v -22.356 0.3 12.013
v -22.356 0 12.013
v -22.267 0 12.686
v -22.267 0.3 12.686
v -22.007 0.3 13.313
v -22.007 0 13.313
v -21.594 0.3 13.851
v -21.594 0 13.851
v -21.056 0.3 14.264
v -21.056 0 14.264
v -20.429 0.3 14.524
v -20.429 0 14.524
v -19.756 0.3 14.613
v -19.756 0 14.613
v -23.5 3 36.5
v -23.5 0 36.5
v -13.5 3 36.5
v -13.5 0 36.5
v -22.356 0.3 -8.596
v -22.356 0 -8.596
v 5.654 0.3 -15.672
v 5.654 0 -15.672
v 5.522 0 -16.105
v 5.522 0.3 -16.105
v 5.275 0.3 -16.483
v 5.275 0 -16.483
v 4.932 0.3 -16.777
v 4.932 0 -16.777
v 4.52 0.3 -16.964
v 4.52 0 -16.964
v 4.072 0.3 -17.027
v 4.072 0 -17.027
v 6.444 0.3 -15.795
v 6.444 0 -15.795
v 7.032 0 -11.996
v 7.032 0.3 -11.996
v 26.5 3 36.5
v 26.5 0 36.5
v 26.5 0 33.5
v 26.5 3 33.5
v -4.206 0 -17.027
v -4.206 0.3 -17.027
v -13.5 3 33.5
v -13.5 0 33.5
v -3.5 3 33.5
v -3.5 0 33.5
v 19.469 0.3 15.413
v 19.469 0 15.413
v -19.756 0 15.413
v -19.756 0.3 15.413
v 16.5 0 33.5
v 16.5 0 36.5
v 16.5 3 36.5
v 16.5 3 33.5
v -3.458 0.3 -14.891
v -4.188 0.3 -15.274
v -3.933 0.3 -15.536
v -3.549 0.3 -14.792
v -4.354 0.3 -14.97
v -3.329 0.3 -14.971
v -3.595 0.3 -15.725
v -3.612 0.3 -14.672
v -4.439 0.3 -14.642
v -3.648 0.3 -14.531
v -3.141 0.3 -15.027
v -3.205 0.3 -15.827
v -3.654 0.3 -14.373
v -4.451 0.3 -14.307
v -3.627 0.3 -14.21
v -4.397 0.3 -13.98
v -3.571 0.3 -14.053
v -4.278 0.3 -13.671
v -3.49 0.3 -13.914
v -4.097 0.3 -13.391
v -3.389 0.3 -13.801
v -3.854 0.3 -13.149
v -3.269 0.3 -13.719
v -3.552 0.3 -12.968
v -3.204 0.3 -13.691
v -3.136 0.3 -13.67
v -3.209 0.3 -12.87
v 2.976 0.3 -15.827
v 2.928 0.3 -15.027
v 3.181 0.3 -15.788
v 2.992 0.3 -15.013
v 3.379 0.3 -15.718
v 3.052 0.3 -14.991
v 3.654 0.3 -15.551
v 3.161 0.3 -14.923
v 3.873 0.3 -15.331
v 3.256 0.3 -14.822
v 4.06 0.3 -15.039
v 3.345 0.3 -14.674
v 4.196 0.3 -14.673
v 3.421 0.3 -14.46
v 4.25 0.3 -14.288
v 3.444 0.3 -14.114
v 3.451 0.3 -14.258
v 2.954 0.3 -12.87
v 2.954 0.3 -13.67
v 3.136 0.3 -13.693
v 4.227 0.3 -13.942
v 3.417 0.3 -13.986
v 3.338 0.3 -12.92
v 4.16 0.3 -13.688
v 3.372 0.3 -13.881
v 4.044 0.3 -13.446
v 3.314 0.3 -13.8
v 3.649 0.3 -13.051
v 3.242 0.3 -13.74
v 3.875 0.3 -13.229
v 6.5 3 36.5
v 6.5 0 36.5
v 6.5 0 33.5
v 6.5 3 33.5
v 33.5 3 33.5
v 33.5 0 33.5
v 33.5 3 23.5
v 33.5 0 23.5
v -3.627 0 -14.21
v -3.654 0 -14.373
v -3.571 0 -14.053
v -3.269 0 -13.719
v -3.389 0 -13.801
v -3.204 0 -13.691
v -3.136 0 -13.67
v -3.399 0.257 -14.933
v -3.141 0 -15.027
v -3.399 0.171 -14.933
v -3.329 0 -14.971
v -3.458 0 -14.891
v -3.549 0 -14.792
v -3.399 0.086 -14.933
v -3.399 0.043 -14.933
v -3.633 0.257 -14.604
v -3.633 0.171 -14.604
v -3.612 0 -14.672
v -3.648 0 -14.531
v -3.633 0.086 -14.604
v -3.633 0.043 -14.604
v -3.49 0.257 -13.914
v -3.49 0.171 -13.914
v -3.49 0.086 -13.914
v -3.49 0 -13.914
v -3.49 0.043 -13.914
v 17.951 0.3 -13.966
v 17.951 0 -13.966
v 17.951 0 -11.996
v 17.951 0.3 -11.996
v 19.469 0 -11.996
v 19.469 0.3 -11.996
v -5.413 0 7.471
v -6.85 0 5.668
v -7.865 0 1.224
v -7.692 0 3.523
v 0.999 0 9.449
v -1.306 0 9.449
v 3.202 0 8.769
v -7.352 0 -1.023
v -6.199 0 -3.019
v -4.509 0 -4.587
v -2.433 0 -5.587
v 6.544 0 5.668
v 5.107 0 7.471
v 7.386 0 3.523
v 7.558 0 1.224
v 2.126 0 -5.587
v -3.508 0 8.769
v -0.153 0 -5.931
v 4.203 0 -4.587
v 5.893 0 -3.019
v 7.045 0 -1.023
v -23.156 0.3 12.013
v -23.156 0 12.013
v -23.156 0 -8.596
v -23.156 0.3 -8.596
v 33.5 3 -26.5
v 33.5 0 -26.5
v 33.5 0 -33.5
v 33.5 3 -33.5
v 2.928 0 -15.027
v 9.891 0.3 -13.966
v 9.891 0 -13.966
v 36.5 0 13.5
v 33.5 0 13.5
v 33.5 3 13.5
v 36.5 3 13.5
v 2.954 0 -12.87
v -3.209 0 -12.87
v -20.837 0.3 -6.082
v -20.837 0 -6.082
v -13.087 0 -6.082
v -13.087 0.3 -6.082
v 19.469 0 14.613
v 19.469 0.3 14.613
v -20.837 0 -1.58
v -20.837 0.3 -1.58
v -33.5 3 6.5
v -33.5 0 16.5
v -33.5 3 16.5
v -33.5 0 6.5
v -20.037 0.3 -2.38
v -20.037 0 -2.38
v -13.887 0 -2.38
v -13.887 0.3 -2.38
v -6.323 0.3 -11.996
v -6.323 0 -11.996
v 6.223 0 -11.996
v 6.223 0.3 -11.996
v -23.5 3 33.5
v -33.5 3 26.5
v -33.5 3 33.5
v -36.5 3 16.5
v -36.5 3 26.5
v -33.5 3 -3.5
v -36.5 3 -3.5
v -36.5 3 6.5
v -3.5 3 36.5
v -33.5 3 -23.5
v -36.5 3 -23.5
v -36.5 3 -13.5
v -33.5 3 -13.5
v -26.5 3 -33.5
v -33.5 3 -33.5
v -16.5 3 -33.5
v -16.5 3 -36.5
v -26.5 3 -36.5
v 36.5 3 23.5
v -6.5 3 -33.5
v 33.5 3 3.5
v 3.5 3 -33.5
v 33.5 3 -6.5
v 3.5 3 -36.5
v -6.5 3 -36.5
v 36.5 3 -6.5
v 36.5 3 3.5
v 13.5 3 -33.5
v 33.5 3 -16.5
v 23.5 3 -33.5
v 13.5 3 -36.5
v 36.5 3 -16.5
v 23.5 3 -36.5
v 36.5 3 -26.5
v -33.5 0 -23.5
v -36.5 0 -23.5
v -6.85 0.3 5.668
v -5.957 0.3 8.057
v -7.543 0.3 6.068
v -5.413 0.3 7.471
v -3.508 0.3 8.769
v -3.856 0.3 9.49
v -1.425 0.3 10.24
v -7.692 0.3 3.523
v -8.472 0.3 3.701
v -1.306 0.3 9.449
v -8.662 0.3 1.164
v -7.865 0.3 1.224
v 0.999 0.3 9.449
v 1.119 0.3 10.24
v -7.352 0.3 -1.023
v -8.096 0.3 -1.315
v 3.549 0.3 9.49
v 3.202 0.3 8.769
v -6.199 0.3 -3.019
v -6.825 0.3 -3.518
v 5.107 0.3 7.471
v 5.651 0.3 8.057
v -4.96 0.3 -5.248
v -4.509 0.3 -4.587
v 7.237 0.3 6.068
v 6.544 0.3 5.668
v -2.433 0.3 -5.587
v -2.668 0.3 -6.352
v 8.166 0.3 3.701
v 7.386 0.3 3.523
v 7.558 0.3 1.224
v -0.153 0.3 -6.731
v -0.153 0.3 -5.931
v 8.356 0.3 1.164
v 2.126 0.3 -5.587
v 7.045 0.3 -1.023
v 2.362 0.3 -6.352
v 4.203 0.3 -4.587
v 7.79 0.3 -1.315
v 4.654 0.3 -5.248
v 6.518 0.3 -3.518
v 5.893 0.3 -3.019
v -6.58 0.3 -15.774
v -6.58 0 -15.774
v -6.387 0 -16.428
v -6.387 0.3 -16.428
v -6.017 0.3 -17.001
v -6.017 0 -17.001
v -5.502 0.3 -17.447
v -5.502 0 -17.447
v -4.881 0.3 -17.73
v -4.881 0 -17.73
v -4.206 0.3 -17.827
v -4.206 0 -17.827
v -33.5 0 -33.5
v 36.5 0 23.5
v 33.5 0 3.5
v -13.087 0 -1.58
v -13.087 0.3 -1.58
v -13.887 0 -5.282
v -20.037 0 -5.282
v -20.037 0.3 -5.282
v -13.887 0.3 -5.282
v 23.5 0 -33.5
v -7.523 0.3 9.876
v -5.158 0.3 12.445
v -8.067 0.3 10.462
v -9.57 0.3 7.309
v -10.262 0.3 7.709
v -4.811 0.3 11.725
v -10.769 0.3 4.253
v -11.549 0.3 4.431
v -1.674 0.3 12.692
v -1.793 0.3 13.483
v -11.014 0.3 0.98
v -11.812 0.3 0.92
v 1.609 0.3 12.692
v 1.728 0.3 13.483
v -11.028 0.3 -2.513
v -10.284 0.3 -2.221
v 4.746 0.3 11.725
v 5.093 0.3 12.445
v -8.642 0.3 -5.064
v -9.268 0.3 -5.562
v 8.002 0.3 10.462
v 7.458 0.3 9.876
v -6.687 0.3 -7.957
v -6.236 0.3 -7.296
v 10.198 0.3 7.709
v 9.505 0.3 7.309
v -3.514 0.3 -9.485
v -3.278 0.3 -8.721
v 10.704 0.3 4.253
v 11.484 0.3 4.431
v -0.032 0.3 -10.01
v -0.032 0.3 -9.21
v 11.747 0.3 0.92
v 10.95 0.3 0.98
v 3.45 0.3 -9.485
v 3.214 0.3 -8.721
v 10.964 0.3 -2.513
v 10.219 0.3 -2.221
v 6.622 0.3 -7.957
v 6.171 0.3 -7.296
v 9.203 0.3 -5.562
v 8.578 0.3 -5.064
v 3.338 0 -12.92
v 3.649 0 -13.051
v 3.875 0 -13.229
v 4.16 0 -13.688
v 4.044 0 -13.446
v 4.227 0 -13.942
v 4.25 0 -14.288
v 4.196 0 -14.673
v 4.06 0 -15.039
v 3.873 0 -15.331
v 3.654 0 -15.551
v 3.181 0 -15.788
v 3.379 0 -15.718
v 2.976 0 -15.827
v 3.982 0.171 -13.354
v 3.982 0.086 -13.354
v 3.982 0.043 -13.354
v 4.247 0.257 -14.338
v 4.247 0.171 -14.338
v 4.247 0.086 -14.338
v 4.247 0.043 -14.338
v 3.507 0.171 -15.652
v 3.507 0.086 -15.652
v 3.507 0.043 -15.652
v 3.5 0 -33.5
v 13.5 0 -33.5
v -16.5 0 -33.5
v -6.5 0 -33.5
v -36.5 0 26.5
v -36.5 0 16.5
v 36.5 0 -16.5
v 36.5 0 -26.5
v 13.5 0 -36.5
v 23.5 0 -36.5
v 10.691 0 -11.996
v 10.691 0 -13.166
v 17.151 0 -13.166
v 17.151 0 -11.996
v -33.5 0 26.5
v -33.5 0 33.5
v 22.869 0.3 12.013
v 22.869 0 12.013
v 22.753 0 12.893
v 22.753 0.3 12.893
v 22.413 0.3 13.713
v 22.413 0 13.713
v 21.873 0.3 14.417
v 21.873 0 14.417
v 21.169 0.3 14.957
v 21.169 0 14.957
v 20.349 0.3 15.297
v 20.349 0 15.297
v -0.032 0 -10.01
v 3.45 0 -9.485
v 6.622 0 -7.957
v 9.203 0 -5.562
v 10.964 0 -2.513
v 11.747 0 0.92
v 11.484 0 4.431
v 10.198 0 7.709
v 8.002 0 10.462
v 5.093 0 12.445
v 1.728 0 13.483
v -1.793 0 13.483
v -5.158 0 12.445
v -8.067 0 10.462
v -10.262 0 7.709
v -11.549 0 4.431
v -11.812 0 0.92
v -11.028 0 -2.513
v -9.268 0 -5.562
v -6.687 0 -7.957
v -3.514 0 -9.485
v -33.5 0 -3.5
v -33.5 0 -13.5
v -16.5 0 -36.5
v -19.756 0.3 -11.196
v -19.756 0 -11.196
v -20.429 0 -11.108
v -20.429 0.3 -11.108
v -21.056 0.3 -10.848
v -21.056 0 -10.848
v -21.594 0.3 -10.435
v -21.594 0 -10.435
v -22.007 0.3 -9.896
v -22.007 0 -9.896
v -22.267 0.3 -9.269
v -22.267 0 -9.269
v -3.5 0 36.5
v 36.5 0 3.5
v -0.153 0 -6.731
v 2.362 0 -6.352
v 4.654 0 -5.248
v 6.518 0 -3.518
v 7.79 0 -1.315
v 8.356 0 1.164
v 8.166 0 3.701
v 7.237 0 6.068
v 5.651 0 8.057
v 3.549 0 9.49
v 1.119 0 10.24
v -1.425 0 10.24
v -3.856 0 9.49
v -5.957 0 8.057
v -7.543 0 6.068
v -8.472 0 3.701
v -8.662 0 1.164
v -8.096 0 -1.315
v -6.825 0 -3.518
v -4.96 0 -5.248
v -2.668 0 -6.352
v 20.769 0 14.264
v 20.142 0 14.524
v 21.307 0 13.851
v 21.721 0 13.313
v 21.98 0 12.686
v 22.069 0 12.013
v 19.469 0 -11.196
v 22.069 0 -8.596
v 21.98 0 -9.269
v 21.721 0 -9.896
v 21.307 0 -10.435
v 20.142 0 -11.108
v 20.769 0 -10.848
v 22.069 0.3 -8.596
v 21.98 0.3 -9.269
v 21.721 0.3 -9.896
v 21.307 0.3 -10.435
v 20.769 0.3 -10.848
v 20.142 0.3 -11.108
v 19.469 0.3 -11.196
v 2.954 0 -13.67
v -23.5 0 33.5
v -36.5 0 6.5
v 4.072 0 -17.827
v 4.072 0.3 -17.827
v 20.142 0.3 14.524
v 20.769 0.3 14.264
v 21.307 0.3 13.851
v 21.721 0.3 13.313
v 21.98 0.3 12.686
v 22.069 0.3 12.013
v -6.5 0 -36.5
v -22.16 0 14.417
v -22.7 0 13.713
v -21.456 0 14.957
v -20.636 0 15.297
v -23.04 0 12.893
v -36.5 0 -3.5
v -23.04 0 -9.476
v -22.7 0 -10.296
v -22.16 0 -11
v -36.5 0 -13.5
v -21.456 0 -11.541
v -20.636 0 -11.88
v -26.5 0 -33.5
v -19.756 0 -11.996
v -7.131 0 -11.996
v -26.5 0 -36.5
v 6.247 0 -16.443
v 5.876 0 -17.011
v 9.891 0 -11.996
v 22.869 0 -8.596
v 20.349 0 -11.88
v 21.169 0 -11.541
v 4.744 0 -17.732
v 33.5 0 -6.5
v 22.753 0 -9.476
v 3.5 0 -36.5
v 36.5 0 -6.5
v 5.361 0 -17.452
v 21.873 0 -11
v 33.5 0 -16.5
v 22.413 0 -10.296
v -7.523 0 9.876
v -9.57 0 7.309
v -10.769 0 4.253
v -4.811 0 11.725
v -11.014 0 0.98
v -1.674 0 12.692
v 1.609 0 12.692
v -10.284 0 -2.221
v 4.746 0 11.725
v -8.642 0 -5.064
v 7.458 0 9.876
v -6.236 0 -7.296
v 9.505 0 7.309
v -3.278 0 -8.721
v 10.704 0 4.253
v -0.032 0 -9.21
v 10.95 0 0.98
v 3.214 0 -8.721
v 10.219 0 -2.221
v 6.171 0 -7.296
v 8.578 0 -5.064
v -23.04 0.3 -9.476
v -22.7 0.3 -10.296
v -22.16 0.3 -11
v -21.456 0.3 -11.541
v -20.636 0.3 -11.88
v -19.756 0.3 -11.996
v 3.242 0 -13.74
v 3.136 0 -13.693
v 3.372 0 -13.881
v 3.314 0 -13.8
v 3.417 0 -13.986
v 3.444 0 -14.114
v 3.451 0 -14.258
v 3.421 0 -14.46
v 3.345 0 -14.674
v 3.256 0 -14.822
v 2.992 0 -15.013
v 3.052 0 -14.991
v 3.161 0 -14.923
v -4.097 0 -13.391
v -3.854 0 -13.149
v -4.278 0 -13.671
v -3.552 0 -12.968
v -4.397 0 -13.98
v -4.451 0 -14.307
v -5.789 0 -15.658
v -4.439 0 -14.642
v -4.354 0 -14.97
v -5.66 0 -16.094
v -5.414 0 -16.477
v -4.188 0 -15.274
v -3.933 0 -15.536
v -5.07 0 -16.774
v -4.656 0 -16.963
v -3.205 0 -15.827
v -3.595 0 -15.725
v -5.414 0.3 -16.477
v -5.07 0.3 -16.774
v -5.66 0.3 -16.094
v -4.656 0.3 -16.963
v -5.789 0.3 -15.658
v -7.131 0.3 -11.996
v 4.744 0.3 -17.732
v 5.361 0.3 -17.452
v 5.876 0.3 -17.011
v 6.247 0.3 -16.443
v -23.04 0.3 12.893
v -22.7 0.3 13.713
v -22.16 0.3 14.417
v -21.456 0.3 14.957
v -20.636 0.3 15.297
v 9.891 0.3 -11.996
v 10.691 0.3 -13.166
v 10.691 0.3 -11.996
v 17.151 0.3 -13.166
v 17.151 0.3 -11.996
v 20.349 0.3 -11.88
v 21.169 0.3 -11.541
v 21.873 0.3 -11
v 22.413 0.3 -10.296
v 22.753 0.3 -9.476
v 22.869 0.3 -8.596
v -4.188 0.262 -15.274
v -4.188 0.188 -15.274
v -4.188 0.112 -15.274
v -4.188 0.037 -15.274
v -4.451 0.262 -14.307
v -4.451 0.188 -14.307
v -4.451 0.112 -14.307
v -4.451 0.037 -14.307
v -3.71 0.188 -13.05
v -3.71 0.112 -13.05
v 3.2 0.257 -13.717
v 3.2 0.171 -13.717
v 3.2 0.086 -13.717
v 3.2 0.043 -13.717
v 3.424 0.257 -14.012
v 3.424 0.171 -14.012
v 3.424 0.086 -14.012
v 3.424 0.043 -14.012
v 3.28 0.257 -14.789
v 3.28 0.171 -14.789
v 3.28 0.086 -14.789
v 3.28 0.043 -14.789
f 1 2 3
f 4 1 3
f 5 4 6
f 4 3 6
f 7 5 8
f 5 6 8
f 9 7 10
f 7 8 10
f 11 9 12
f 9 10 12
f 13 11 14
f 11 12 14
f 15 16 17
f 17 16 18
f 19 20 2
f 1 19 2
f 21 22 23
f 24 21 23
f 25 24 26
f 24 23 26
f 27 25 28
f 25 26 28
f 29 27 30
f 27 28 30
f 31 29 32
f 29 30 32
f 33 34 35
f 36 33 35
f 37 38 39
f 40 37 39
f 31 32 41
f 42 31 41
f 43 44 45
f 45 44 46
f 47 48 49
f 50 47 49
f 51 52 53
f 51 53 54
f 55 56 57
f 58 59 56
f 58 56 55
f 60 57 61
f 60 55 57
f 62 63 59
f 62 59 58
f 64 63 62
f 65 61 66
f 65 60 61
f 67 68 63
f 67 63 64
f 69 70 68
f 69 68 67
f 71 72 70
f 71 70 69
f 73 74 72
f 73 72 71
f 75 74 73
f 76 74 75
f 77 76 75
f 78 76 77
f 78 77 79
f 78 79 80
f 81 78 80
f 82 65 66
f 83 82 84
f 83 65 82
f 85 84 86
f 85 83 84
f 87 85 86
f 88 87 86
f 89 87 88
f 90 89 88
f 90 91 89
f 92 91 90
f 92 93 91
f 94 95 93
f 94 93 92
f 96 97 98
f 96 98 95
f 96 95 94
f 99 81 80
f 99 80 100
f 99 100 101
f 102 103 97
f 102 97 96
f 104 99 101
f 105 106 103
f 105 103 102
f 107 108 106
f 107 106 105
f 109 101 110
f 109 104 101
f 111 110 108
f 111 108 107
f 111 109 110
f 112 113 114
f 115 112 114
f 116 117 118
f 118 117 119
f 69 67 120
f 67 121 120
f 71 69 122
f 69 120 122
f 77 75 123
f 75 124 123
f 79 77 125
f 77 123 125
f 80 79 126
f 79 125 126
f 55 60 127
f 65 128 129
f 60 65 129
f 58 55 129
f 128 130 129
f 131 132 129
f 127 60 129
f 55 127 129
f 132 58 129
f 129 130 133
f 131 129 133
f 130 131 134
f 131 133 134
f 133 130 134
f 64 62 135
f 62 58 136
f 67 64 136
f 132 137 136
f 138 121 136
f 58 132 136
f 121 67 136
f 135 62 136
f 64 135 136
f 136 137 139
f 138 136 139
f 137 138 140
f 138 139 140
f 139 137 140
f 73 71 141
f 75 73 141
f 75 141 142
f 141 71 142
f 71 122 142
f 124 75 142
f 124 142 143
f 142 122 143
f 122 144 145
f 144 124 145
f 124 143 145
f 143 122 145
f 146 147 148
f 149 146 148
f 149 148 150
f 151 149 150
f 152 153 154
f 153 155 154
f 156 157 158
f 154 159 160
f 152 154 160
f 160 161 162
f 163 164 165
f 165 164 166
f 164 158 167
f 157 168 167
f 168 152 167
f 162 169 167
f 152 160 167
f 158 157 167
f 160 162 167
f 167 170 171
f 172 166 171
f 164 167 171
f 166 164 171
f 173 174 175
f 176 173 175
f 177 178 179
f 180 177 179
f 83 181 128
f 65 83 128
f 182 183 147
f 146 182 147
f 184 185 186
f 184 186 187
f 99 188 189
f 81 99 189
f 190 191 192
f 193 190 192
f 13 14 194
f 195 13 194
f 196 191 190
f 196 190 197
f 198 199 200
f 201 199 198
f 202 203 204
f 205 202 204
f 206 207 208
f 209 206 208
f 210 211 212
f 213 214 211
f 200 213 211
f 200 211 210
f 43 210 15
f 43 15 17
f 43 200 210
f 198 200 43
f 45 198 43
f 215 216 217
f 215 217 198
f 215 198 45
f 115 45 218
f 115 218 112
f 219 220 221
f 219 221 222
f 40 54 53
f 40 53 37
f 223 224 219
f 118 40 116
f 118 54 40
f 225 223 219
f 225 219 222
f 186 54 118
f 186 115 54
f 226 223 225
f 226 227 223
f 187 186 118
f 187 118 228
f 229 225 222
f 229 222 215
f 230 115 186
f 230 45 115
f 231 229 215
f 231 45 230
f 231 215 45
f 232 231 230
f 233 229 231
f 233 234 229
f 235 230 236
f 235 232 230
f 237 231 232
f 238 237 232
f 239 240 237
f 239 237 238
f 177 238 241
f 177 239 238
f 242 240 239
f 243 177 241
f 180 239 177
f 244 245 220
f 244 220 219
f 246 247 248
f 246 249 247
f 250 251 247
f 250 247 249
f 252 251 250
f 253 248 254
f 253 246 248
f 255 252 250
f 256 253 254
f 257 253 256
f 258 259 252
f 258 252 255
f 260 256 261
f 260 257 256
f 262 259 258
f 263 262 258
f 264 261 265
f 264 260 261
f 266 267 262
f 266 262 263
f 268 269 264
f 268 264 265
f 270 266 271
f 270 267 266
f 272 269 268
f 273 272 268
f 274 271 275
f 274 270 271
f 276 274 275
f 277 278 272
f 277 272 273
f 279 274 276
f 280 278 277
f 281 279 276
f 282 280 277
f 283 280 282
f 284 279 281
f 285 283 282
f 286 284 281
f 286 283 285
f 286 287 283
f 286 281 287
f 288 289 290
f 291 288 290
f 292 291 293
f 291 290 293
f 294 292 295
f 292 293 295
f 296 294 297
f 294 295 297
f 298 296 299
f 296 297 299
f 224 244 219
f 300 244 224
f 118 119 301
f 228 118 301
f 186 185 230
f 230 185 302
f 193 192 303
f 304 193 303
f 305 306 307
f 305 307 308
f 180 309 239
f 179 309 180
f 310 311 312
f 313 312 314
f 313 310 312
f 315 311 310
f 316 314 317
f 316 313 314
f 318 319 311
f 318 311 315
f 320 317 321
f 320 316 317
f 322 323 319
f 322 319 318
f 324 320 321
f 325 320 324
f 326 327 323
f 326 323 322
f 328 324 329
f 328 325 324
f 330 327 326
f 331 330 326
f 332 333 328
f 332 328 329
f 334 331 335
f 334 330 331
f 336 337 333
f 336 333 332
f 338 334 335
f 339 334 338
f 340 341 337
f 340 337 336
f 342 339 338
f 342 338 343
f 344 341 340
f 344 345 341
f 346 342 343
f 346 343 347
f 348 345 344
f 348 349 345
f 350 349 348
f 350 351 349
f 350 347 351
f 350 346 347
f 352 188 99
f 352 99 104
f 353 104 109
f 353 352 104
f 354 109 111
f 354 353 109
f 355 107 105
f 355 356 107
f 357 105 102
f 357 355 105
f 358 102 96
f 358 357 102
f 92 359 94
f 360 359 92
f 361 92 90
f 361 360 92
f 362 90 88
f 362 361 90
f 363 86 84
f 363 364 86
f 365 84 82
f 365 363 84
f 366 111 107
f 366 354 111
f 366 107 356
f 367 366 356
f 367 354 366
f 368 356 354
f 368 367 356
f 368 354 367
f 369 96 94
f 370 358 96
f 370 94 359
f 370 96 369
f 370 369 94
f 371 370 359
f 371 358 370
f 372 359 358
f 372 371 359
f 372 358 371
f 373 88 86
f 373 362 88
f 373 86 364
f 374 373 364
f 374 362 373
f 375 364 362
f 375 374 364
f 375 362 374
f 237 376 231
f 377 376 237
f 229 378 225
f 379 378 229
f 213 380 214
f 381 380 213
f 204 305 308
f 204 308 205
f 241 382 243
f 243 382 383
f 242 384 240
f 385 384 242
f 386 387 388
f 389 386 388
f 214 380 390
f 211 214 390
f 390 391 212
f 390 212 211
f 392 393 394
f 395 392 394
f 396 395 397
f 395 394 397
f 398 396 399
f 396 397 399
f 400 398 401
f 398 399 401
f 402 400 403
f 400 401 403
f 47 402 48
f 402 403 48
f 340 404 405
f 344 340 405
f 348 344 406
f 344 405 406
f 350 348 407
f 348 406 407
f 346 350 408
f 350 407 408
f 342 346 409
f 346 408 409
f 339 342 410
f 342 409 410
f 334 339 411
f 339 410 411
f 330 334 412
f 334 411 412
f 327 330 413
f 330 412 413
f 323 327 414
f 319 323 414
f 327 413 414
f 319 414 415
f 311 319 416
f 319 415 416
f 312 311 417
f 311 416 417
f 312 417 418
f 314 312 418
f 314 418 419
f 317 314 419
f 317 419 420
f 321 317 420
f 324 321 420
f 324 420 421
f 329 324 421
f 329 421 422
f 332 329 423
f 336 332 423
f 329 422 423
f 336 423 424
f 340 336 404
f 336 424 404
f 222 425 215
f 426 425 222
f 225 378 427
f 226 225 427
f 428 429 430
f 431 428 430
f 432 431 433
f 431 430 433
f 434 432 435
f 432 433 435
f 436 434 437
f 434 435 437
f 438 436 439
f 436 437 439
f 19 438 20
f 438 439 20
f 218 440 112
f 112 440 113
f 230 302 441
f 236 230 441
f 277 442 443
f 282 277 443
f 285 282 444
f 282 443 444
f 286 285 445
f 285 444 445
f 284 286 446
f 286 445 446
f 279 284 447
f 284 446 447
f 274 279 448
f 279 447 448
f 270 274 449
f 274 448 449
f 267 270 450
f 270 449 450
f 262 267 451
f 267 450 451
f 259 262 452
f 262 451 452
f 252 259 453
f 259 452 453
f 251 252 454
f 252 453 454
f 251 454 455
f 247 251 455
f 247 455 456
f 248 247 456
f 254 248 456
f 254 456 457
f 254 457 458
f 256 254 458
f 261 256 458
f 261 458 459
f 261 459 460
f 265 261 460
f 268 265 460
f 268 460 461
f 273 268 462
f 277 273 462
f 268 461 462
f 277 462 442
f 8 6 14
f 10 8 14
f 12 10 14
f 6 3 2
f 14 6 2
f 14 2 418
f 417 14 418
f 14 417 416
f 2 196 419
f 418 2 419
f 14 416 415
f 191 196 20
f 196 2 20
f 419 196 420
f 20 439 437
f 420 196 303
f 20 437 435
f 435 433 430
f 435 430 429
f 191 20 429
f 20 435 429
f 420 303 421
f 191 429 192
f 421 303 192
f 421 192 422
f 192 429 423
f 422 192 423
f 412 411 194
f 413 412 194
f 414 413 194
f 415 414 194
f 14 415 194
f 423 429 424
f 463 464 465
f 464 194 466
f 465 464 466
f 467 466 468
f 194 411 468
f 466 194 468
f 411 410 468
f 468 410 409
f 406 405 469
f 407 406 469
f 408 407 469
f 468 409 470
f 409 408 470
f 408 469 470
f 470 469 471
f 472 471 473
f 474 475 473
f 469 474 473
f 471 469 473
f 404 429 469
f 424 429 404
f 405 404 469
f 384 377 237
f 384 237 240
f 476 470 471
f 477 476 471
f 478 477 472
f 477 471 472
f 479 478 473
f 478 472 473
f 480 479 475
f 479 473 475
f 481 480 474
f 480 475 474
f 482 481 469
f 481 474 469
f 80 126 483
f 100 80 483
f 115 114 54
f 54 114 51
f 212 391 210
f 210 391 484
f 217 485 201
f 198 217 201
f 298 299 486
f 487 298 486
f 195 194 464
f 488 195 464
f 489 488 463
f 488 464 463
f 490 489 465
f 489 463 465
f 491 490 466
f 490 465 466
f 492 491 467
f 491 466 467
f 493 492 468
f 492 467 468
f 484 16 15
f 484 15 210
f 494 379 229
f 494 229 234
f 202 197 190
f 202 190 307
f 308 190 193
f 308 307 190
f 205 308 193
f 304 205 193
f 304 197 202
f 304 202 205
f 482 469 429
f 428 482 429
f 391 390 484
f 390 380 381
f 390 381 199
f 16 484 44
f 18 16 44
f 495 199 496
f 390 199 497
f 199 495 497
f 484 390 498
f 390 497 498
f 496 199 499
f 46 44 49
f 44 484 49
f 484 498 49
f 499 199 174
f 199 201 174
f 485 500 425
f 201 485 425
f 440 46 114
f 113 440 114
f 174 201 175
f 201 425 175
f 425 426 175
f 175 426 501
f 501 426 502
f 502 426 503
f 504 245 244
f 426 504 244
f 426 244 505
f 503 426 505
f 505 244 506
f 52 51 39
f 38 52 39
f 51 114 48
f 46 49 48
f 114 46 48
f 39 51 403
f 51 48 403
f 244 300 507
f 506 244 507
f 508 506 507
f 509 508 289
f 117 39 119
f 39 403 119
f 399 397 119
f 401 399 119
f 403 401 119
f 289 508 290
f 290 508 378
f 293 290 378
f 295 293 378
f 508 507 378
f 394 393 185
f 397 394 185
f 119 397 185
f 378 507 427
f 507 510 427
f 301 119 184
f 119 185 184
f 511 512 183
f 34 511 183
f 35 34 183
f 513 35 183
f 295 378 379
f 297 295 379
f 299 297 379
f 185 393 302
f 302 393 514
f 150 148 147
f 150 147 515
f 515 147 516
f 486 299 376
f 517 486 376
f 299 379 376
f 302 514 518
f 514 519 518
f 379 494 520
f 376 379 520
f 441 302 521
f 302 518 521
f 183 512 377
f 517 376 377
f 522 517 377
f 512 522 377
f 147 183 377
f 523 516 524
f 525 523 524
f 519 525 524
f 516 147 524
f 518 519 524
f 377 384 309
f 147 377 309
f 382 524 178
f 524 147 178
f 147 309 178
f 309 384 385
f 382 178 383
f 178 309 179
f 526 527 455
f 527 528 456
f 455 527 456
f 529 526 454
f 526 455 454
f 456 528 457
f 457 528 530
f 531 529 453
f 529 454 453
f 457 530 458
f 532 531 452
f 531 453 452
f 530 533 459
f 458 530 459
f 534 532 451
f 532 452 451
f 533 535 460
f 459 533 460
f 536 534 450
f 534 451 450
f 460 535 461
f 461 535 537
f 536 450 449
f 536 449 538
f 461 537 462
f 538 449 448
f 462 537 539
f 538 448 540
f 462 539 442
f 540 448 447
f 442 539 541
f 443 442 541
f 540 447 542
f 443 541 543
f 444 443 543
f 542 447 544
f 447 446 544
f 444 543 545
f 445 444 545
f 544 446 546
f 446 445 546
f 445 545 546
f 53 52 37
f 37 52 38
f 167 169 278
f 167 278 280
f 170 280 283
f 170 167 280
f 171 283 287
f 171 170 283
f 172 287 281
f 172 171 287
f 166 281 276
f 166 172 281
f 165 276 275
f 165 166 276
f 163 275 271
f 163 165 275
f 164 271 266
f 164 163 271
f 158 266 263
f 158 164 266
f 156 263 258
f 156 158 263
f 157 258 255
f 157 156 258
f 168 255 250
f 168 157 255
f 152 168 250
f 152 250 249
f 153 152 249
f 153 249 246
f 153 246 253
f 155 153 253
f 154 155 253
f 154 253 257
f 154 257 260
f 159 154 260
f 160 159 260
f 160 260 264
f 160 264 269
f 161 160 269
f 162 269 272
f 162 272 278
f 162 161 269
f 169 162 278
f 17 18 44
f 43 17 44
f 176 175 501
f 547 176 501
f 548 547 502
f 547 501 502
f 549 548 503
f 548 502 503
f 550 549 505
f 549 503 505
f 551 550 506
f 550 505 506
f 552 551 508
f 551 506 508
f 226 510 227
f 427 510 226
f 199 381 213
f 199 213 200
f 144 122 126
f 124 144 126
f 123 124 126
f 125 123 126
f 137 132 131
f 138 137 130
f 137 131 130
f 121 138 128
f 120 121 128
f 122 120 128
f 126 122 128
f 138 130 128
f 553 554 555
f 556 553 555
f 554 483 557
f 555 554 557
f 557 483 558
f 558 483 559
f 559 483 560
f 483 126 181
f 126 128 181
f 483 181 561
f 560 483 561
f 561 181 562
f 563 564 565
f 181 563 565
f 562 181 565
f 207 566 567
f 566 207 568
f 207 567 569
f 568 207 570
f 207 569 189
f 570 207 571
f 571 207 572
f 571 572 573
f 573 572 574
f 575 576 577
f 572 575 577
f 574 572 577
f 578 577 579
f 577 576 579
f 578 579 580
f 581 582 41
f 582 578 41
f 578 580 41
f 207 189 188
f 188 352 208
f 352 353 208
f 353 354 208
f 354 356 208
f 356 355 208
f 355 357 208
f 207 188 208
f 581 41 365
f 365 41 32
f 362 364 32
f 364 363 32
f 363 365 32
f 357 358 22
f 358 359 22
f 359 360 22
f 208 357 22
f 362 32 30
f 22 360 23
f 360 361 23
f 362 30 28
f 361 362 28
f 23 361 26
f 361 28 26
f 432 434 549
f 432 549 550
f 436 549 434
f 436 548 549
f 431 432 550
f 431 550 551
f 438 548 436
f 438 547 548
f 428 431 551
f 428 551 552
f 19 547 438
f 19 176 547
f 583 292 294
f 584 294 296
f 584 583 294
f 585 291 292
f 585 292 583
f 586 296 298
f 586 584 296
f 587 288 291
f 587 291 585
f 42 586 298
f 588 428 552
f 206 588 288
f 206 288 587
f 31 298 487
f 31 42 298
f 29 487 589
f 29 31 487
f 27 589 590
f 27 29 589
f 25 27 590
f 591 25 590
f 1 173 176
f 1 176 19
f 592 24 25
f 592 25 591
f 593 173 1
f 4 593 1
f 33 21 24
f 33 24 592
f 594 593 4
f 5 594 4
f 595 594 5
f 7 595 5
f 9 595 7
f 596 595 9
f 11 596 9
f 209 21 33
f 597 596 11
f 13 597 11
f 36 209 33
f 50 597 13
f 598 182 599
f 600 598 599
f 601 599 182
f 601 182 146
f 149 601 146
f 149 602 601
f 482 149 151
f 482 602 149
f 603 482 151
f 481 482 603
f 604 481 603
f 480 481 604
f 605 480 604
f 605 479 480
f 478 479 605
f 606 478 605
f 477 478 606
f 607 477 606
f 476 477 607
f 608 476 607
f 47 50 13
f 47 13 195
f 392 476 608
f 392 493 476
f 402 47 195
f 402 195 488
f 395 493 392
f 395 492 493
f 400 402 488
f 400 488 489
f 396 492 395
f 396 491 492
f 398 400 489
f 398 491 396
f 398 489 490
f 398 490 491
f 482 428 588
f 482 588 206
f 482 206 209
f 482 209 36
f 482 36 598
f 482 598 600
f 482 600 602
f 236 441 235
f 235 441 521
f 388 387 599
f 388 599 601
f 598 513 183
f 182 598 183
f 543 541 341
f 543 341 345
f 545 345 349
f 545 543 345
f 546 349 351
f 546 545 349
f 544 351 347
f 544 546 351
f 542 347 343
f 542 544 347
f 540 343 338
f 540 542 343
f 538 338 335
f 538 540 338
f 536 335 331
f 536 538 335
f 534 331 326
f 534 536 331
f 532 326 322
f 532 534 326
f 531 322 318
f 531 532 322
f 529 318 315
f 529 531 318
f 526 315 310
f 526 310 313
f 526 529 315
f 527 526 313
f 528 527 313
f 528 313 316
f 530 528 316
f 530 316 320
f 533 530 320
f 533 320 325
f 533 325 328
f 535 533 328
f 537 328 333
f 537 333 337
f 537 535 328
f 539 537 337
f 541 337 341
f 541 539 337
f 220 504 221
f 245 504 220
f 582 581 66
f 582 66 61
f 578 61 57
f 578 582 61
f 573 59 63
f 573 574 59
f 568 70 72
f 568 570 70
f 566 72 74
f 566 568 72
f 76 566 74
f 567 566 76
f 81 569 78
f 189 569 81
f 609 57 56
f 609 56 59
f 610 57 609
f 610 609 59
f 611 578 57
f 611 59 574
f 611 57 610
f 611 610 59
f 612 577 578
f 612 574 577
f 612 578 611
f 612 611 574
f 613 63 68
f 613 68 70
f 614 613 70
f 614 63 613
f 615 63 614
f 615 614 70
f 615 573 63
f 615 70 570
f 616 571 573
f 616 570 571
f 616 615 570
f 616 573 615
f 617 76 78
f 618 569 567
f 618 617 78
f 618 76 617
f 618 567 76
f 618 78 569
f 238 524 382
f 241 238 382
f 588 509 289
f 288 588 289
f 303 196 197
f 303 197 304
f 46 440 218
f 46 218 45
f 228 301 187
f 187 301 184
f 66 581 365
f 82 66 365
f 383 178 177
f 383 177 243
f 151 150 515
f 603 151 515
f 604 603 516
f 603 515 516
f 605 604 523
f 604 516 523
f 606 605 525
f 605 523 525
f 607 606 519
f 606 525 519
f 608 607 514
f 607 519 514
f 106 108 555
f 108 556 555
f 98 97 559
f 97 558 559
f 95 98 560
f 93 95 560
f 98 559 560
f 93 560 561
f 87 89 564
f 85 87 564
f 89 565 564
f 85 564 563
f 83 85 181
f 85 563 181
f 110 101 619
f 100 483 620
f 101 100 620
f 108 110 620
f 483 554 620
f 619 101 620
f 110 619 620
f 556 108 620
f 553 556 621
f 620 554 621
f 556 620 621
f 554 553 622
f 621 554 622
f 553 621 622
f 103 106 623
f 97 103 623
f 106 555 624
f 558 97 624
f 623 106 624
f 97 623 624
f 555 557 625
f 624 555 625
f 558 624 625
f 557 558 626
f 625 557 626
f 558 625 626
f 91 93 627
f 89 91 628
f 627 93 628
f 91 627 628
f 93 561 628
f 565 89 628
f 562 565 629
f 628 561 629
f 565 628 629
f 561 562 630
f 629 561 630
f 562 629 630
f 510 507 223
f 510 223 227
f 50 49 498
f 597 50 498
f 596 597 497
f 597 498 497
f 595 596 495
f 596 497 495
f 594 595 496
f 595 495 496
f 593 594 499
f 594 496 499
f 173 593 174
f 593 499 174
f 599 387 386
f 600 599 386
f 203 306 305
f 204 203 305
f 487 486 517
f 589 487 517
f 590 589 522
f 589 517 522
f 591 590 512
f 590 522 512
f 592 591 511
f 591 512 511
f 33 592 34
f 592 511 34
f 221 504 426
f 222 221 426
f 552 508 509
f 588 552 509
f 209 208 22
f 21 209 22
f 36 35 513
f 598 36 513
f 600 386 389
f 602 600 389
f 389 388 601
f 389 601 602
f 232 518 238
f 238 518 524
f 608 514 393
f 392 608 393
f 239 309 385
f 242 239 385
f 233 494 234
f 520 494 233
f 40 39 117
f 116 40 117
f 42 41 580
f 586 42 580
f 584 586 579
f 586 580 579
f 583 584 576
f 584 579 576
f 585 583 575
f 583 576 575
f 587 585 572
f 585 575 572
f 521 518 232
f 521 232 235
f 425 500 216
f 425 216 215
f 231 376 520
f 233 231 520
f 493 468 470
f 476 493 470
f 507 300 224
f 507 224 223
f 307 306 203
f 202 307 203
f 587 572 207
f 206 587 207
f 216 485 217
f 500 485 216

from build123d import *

# Parameters (mm, degrees)
SKETCH1_W           = 67
SKETCH1_H           = 67
SKETCH1_W_2         = 3
SKETCH1_H_2         = 10
SKETCH1_W_3         = 10
SKETCH1_H_3         = 3
BOSS_EXTRUDE1_DEPTH = 3
SKETCH3_W           = 6.460545278
SKETCH3_H           = 1.169767542
SKETCH3_W_2         = 7.74987154
SKETCH3_H_2         = 4.501562016
SKETCH3_W_3         = 6.14987154
SKETCH3_H_3         = 2.901562016
SKETCH3_R           = 11.812674278
SKETCH3_R_2         = 11.012674278
SKETCH3_R_3         = 8.532957956
SKETCH3_R_4         = 7.732957956
CUT_EXTRUDE1_DEPTH  = 0.3


with BuildPart() as part:
    # Sketch1 → Boss-Extrude1 (new body)
    with BuildSketch(Plane(origin=(0, 0, 0), x_dir=(1, 0, 0), z_dir=(0, 1, 0))):
        Rectangle(SKETCH1_W, SKETCH1_H)
        with Locations((-35, -21.5)):
            Rectangle(SKETCH1_W_2, SKETCH1_H_2)
        with Locations((-35, -1.5)):
            Rectangle(SKETCH1_W_2, SKETCH1_H_2)
        with Locations((-35, 18.5)):
            Rectangle(SKETCH1_W_2, SKETCH1_H_2)
        with Locations((-18.5, -35)):
            Rectangle(SKETCH1_W_3, SKETCH1_H_3)
        with Locations((1.5, -35)):
            Rectangle(SKETCH1_W_3, SKETCH1_H_3)
        with Locations((21.5, -35)):
            Rectangle(SKETCH1_W_3, SKETCH1_H_3)
        with Locations((35, -18.5)):
            Rectangle(SKETCH1_W_2, SKETCH1_H_2)
        with Locations((35, 1.5)):
            Rectangle(SKETCH1_W_2, SKETCH1_H_2)
        with Locations((35, 21.5)):
            Rectangle(SKETCH1_W_2, SKETCH1_H_2)
        with Locations((18.5, 35)):
            Rectangle(SKETCH1_W_3, SKETCH1_H_3)
        with Locations((-1.5, 35)):
            Rectangle(SKETCH1_W_3, SKETCH1_H_3)
        with Locations((-21.5, 35)):
            Rectangle(SKETCH1_W_3, SKETCH1_H_3)
    extrude(amount=BOSS_EXTRUDE1_DEPTH)

    # Sketch3 → Cut-Extrude1 (cut)
    # profile 1 of 5: a face of its own
    with BuildSketch(Plane.XZ):
        with BuildLine():
            Line((17.951474003, -11.996306148), (19.468912415, -11.996306148))
            ThreePointArc((19.468912415, -11.996306148), (21.873075471, -11.000469204), (22.868912415, -8.596306148))
            Line((22.868912415, -8.596306148), (22.868912415, 12.012813943))
            ThreePointArc((22.868912415, 12.012813943), (21.873075471, 14.416976999), (19.468912415, 15.412813943))
            Line((19.468912415, 15.412813943), (-19.75568403, 15.412813943))
            ThreePointArc((-19.75568403, 15.412813943), (-22.159847086, 14.416976999), (-23.15568403, 12.012813943))
            Line((-23.15568403, 12.012813943), (-23.15568403, -8.596306148))
            ThreePointArc((-23.15568403, -8.596306148), (-22.159847086, -11.000469204), (-19.75568403, -11.996306148))
            Line((-19.75568403, -11.996306148), (-7.131170101, -11.996306148))
            Line((-7.131170101, -11.996306148), (-6.58045367, -15.77368629))
            ThreePointArc((-6.58045367, -15.77368629), (-5.775436093, -17.242792), (-4.205560916, -17.827443017))
            Line((-4.205560916, -17.827443017), (4.072492002, -17.827443017))
            ThreePointArc((4.072492002, -17.827443017), (5.634337803, -17.249704715), (6.444235152, -15.794641095))
            Line((6.444235152, -15.794641095), (7.032301062, -11.996306148))
            Line((7.032301062, -11.996306148), (9.890928725, -11.996306148))
            Line((9.890928725, -11.996306148), (9.890928725, -13.96607369))
            Line((9.890928725, -13.96607369), (17.951474003, -13.96607369))
            Line((17.951474003, -13.96607369), (17.951474003, -11.996306148))
        make_face()
        with BuildLine():
            Line((-6.322712542, -11.996306148), (6.222769895, -11.996306148))
            Line((6.222769895, -11.996306148), (5.653654102, -15.672241736))
            ThreePointArc((5.653654102, -15.672241736), (5.113722536, -16.642284149), (4.072492002, -17.027443017))
            Line((4.072492002, -17.027443017), (-4.205560916, -17.027443017))
            ThreePointArc((-4.205560916, -17.027443017), (-5.252144367, -16.637675672), (-5.788822752, -15.658271866))
            Line((-5.788822752, -15.658271866), (-6.322712542, -11.996306148))
        make_face(mode=Mode.SUBTRACT)
        with Locations((13.921201364, -12.581189919)):
            Rectangle(SKETCH3_W, SKETCH3_H, mode=Mode.SUBTRACT)
        with BuildLine():
            ThreePointArc((22.068912415, -8.596306148), (21.307390046, -10.434783779), (19.468912415, -11.196306148))
            Line((19.468912415, -11.196306148), (-19.75568403, -11.196306148))
            ThreePointArc((-19.75568403, -11.196306148), (-21.594161661, -10.434783779), (-22.35568403, -8.596306148))
            Line((-22.35568403, -8.596306148), (-22.35568403, 12.012813943))
            ThreePointArc((-22.35568403, 12.012813943), (-21.594161661, 13.851291574), (-19.75568403, 14.612813943))
            Line((-19.75568403, 14.612813943), (19.468912415, 14.612813943))
            ThreePointArc((19.468912415, 14.612813943), (21.307390046, 13.851291574), (22.068912415, 12.012813943))
            Line((22.068912415, 12.012813943), (22.068912415, -8.596306148))
        make_face(mode=Mode.SUBTRACT)
    # profile 2 of 5: a face of its own
    with BuildSketch(Plane.XZ):
        with BuildLine():
            Line((-3.20545277, -15.827443017), (2.975704553, -15.827443017))
            add(Edge.make_bspline(
                [(2.953511817, -12.870475248), (3.156880299, -12.869857322), (3.585089851, -12.956102965), (4.018056229, -13.335311226), (4.232845726, -13.825946117), (4.282993557, -14.510967663), (4.056789396, -15.180852207), (3.536001149, -15.684997342), (3.16114062, -15.80680282), (2.975704553, -15.827443017)],
                knots=[0.000309469, 0.000309469, 0.000309469, 0.000309469, 0.126123229, 0.251936989, 0.37775075, 0.50356451, 0.75519203, 0.881005791, 1.006819551, 1.006819551, 1.006819551, 1.006819551], degree=3))
            Line((2.953511817, -12.870475248), (-3.208812782, -12.870477681))
            add(Edge.make_bspline(
                [(-3.20545277, -15.827443017), (-3.402440677, -15.796950089), (-3.804790668, -15.67436393), (-4.360046403, -15.161364486), (-4.548558911, -14.293381235), (-4.249990898, -13.494614941), (-3.796080691, -13.08166476), (-3.514079359, -12.94650227), (-3.330583264, -12.891839413), (-3.250572572, -12.877657517), (-3.208812782, -12.870477681)],
                knots=[-0.01081197, -0.01081197, -0.01081197, -0.01081197, 0.116511645, 0.24383526, 0.49848249, 0.75312972, 0.880453335, 0.944115143, 0.975946047, 1.00777695, 1.00777695, 1.00777695, 1.00777695], degree=3))
        make_face()
        with BuildLine():
            add(Edge.make_bspline(
                [(2.954312548, -13.670477681), (3.002162708, -13.670286106), (3.107702292, -13.680346372), (3.235248962, -13.726706918), (3.341954697, -13.812630756), (3.434286544, -13.998064842), (3.47500749, -14.35295522), (3.304919264, -14.84862877), (3.068019803, -15.006185035), (2.927947638, -15.027443017)],
                knots=[-0.000203812, -0.000203812, -0.000203812, -0.000203812, 0.061637445, 0.123478703, 0.247161218, 0.370843733, 0.494526248, 0.741891278, 0.989256308, 0.989256308, 0.989256308, 0.989256308], degree=3))
            Line((2.927947638, -15.027443017), (-3.141370514, -15.027443017))
            add(Edge.make_bspline(
                [(-3.141370514, -15.027443017), (-3.191002063, -15.018349114), (-3.295796079, -14.989541193), (-3.43833154, -14.916637531), (-3.558968521, -14.800275144), (-3.643853224, -14.612459797), (-3.674059975, -14.29626228), (-3.520794101, -13.870784083), (-3.275666554, -13.702096641), (-3.135980342, -13.670477681)],
                knots=[0.01613903, 0.01613903, 0.01613903, 0.01613903, 0.077002925, 0.137866819, 0.259594608, 0.381322398, 0.503050187, 0.746505765, 0.989961344, 0.989961344, 0.989961344, 0.989961344], degree=3))
            Line((-3.135980342, -13.670477681), (2.954312548, -13.670477681))
        make_face(mode=Mode.SUBTRACT)
    # profile 3 of 5: a face of its own
    with BuildSketch(Plane.XZ):
        with Locations((-16.962226762, -3.831057055)):
            Rectangle(SKETCH3_W_2, SKETCH3_H_2)
        with Locations((-16.962226762, -3.831057055)):
            Rectangle(SKETCH3_W_3, SKETCH3_H_3, mode=Mode.SUBTRACT)
    # profile 4 of 5: a face of its own
    with BuildSketch(Plane.XZ):
        with Locations(Location((-0.032284279, 1.802644777, 0), (0, 0, 270))):
            Circle(SKETCH3_R)
        with Locations(Location((-0.032284279, 1.802644777, 0), (0, 0, 270))):
            Circle(SKETCH3_R_2, mode=Mode.SUBTRACT)
    # profile 5 of 5: a face of its own
    with BuildSketch(Plane.XZ):
        with Locations(Location((-0.153217329, 1.801981193, 0), (0, 0, 270))):
            Circle(SKETCH3_R_3)
        with Locations(Location((-0.153217329, 1.801981193, 0), (0, 0, 270))):
            Circle(SKETCH3_R_4, mode=Mode.SUBTRACT)
    extrude(amount=-CUT_EXTRUDE1_DEPTH, mode=Mode.SUBTRACT)


solid = part.part
